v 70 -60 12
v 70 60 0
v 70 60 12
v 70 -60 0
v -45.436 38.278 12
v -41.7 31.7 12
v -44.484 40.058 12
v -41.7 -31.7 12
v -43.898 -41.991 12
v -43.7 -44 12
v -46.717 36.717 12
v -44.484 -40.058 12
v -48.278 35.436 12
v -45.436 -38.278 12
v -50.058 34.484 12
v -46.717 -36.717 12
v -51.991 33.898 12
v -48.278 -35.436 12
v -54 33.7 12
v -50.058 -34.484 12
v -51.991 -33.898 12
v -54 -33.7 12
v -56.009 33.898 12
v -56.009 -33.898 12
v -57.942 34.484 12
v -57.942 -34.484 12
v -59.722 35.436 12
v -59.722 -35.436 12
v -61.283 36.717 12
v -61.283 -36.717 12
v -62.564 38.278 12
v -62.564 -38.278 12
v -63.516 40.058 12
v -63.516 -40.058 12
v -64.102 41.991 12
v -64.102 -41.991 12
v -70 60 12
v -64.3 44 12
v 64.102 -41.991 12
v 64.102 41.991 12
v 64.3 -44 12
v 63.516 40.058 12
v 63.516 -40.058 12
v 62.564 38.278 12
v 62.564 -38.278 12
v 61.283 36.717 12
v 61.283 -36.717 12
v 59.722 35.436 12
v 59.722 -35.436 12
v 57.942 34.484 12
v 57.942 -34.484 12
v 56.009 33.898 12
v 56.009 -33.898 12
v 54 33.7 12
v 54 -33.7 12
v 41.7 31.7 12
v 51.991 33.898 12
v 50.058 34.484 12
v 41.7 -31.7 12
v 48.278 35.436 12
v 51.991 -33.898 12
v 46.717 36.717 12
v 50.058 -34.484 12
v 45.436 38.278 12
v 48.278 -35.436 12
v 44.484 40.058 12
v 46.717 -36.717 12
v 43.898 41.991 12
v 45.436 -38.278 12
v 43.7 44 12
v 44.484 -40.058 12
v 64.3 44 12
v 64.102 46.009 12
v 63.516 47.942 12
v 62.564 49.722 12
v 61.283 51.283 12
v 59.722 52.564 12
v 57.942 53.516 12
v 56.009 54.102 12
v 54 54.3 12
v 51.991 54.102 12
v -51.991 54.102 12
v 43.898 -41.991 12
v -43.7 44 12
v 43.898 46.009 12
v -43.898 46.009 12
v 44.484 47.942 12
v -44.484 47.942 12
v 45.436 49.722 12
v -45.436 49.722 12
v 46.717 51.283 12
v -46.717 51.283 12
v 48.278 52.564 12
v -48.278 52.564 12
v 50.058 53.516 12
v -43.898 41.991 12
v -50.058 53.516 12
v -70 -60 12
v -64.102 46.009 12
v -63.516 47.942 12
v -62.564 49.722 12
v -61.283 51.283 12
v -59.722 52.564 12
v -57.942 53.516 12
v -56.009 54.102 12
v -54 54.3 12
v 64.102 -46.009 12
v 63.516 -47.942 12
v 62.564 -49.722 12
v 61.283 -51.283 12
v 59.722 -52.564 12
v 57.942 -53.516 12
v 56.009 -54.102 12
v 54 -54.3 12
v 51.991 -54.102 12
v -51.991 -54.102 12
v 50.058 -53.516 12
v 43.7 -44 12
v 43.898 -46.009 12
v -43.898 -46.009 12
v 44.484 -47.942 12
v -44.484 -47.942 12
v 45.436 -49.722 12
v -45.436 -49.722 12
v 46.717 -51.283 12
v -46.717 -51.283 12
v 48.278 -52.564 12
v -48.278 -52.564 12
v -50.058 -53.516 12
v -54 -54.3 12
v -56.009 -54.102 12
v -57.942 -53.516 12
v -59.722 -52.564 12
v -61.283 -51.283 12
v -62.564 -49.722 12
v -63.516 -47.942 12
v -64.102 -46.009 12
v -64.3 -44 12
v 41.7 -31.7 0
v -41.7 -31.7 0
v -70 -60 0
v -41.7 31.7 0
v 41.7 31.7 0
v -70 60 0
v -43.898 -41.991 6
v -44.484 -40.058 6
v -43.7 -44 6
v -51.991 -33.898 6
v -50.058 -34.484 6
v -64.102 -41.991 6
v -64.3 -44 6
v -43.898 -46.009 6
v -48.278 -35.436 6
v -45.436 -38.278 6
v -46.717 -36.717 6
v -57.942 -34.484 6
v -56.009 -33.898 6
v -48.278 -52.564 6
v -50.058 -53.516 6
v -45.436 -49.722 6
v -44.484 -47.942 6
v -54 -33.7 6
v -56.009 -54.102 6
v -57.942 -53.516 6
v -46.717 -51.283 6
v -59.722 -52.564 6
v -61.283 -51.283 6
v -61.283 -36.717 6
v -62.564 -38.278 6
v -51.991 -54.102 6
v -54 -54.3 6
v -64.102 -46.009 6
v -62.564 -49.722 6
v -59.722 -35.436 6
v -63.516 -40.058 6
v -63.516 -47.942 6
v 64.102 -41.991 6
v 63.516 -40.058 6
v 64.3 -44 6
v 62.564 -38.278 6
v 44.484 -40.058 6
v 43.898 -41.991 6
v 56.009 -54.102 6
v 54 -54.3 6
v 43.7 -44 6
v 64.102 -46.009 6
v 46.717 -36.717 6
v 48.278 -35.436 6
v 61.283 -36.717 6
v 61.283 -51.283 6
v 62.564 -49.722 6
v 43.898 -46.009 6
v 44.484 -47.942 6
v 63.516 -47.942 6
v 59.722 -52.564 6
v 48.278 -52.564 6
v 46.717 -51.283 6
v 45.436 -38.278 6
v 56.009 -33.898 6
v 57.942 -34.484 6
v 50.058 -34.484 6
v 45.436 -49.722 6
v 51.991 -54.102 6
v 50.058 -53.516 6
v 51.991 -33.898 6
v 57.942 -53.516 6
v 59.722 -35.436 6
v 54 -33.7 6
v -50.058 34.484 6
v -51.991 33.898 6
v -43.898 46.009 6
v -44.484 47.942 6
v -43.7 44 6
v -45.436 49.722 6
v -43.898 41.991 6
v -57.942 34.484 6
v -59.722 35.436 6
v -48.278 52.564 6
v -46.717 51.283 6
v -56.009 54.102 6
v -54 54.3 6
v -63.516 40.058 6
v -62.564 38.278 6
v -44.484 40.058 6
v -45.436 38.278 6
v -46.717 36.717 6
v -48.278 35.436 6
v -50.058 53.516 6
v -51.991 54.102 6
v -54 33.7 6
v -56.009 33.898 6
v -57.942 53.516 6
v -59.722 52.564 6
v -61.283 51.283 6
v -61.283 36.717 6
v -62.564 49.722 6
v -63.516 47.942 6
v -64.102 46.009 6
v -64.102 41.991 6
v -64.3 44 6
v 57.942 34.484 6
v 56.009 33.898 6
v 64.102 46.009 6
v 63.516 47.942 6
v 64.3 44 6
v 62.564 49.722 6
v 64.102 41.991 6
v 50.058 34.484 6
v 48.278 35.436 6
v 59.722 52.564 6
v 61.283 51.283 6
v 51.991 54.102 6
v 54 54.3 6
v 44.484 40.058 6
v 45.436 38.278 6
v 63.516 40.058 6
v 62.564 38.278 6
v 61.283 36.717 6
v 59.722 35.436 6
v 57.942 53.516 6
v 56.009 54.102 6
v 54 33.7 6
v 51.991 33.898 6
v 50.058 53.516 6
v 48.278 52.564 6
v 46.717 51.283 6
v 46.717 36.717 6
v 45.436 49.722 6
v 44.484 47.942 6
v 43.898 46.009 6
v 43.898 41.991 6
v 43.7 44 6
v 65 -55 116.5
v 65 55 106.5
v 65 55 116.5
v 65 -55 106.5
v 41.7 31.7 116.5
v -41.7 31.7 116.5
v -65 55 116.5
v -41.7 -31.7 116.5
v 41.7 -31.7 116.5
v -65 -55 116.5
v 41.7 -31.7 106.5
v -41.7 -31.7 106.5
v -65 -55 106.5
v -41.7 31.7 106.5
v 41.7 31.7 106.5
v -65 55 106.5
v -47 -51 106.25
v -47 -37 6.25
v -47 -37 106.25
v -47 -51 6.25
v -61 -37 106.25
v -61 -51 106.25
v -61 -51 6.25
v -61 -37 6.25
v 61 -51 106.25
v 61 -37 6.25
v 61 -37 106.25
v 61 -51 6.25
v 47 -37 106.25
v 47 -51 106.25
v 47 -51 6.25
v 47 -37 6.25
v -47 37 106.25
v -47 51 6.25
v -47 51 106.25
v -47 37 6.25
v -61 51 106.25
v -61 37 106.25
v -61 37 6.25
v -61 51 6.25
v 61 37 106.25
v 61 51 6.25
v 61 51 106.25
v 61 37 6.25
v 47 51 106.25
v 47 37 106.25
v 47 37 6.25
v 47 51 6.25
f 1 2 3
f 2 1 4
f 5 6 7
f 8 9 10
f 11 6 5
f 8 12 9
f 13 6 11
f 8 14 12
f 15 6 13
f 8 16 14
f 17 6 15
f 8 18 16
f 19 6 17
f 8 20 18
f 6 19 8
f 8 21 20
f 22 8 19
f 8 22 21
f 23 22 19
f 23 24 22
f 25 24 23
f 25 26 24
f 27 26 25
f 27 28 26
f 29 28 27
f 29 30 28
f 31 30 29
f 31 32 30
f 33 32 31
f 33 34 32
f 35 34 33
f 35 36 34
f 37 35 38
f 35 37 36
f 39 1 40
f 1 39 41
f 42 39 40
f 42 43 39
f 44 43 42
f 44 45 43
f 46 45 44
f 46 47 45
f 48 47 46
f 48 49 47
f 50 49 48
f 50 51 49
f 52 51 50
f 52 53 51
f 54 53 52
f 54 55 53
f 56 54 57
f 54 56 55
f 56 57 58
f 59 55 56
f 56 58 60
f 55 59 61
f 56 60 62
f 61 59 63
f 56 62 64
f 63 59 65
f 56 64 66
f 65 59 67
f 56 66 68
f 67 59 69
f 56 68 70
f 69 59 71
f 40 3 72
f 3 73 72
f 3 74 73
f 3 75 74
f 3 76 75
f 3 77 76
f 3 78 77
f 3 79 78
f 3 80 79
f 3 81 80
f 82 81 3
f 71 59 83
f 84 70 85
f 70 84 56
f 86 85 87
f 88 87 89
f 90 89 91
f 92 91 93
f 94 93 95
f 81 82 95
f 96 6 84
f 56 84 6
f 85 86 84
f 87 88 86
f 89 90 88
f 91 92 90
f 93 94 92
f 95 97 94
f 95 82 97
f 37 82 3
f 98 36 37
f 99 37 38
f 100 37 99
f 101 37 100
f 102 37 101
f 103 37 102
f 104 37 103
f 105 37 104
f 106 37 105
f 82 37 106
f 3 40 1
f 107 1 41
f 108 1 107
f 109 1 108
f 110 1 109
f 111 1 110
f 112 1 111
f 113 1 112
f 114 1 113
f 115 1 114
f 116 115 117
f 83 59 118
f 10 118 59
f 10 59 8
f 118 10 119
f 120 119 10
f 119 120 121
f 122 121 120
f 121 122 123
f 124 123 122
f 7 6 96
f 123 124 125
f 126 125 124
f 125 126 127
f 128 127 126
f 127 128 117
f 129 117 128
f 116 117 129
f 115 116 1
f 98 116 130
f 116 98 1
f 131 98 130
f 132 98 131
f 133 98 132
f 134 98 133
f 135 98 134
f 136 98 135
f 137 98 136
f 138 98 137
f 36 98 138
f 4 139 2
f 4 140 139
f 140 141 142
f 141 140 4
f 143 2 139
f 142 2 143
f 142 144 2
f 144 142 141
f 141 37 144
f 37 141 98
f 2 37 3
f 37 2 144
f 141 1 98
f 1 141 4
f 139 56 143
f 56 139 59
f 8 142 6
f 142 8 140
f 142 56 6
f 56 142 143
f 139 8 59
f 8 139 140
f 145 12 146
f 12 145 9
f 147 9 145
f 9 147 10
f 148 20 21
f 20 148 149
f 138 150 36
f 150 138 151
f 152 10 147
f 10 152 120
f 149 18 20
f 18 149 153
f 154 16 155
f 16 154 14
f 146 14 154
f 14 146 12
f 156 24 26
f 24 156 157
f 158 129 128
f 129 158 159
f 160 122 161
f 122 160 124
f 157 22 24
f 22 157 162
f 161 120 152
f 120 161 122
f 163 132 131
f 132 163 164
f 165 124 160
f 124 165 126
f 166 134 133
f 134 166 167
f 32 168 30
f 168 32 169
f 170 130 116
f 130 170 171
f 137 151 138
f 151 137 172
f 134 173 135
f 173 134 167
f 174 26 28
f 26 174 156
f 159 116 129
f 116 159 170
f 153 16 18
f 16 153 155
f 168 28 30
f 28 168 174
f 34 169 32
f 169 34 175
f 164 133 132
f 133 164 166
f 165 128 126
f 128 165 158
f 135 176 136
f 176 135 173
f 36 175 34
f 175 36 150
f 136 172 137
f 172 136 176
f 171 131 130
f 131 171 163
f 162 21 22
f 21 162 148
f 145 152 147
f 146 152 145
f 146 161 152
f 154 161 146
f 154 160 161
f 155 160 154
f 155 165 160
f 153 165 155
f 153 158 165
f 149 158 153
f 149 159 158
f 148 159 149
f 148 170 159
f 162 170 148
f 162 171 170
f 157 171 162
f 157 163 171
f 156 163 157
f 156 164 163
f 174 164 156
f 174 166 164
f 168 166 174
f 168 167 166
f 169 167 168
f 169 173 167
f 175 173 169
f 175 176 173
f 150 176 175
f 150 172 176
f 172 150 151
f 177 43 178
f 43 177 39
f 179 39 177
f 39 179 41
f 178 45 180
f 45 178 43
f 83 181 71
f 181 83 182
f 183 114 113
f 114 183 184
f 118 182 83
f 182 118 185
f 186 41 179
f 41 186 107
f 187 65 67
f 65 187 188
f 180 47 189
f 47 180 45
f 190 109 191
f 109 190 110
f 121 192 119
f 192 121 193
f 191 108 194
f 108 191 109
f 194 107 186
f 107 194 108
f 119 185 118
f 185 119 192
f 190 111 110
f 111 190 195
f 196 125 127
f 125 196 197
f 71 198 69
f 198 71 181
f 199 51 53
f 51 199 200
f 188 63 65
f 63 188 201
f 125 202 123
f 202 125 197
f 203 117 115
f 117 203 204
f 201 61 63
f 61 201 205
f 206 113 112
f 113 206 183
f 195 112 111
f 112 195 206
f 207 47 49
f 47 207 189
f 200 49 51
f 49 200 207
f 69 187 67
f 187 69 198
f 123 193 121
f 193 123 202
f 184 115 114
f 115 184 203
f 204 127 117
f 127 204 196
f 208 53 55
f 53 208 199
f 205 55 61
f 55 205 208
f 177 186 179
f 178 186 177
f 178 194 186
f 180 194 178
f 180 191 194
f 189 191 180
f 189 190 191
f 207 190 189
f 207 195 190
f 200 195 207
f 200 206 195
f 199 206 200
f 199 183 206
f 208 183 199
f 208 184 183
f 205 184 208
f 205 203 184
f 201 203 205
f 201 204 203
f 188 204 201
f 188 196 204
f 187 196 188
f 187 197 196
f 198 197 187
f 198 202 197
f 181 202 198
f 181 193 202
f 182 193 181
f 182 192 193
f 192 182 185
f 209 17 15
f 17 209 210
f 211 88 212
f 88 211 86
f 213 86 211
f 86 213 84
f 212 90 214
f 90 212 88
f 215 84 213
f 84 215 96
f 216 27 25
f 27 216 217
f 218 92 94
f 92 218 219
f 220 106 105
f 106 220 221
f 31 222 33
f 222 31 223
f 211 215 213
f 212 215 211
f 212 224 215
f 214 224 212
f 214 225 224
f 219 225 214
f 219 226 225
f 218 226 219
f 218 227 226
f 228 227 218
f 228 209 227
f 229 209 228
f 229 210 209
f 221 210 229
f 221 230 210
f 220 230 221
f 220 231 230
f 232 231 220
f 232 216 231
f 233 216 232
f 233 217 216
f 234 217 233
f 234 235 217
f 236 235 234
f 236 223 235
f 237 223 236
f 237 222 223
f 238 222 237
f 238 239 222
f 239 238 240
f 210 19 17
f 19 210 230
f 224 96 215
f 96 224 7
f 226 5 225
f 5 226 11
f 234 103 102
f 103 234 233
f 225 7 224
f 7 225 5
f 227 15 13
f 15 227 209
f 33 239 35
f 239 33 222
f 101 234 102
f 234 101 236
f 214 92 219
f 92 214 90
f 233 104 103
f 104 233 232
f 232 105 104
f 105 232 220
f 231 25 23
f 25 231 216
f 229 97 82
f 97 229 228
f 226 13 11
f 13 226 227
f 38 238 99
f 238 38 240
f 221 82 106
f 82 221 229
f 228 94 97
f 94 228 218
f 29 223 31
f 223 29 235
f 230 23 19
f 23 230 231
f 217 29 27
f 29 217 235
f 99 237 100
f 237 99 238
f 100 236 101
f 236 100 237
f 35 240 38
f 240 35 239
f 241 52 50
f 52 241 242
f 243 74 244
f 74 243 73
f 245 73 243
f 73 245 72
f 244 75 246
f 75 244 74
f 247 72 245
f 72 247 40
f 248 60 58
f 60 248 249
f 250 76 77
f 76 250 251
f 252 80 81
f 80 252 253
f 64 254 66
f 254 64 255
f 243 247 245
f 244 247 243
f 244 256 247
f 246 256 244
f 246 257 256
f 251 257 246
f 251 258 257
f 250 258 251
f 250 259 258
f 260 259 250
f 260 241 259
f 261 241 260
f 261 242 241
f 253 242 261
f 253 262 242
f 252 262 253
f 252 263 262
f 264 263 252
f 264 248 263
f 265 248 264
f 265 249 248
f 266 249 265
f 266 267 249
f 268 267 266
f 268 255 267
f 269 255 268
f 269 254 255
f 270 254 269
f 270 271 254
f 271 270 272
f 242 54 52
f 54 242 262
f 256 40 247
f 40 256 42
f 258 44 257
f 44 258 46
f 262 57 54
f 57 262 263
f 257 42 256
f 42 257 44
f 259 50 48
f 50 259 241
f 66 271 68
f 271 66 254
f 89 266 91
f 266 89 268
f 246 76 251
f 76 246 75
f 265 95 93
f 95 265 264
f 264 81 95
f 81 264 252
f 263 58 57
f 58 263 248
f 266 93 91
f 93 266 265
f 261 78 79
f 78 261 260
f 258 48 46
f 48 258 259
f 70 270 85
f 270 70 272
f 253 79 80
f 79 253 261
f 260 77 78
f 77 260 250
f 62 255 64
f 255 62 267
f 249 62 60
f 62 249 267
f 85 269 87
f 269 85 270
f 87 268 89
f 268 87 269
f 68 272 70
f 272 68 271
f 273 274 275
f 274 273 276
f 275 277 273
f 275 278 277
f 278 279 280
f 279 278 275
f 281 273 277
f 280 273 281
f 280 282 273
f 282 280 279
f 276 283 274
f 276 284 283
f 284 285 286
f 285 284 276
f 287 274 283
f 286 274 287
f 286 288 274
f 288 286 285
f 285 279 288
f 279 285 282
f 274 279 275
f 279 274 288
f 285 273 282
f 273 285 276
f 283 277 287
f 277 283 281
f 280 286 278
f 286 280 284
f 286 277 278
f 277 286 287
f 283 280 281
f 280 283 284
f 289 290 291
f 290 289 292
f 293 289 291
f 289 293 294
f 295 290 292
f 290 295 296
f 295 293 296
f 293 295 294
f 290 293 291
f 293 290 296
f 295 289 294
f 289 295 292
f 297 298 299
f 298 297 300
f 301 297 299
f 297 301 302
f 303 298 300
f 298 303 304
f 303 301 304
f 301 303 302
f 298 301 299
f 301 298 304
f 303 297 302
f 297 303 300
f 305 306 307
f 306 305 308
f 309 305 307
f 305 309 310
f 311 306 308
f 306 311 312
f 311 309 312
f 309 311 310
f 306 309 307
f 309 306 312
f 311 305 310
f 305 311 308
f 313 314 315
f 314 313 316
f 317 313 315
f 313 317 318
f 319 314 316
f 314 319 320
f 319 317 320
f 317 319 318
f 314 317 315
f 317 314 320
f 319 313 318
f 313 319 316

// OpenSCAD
$fn = 32;

// ------------------------------------------------------------------------
// Frame cube: base 140 x 120 mm, posts 100 mm tall
// Every part is its own module, assembly() places every instance.
// ------------------------------------------------------------------------

// --- part 1 ---
module base_frame() {
  difference() {
    translate([-70, -60, 0]) cube([140, 120, 12]);
    translate([-41.7, -31.7, -1]) cube([83.4, 63.4, 14]);
    translate([-54, -44, 6]) cylinder(h = 7, d = 20.6);
    translate([54, -44, 6]) cylinder(h = 7, d = 20.6);
    translate([-54, 44, 6]) cylinder(h = 7, d = 20.6);
    translate([54, 44, 6]) cylinder(h = 7, d = 20.6);
  }
}

// --- part 2 ---
module corner_post() {
  translate([-7, -7, 0]) cube([14, 14, 100]);
}

// --- part 3 ---
module top_frame() {
  difference() {
    translate([-65, -55, 0]) cube([130, 110, 10]);
    translate([-41.7, -31.7, -1]) cube([83.4, 63.4, 12]);
  }
}

// --- assembly ---
module assembly() {
  color([0.80, 0.24, 0.20]) translate([0, 0, 0]) rotate([0, 0, 0]) base_frame();
  color([0.20, 0.45, 0.75]) translate([-54, -44, 6.25]) rotate([0, 0, 0]) corner_post();
  color([0.25, 0.62, 0.32]) translate([54, -44, 6.25]) rotate([0, 0, 0]) corner_post();
  color([0.92, 0.70, 0.18]) translate([-54, 44, 6.25]) rotate([0, 0, 0]) corner_post();
  color([0.58, 0.35, 0.70]) translate([54, 44, 6.25]) rotate([0, 0, 0]) corner_post();
  color([0.16, 0.66, 0.66]) translate([0, 0, 106.5]) rotate([0, 0, 0]) top_frame();
}

assembly();
